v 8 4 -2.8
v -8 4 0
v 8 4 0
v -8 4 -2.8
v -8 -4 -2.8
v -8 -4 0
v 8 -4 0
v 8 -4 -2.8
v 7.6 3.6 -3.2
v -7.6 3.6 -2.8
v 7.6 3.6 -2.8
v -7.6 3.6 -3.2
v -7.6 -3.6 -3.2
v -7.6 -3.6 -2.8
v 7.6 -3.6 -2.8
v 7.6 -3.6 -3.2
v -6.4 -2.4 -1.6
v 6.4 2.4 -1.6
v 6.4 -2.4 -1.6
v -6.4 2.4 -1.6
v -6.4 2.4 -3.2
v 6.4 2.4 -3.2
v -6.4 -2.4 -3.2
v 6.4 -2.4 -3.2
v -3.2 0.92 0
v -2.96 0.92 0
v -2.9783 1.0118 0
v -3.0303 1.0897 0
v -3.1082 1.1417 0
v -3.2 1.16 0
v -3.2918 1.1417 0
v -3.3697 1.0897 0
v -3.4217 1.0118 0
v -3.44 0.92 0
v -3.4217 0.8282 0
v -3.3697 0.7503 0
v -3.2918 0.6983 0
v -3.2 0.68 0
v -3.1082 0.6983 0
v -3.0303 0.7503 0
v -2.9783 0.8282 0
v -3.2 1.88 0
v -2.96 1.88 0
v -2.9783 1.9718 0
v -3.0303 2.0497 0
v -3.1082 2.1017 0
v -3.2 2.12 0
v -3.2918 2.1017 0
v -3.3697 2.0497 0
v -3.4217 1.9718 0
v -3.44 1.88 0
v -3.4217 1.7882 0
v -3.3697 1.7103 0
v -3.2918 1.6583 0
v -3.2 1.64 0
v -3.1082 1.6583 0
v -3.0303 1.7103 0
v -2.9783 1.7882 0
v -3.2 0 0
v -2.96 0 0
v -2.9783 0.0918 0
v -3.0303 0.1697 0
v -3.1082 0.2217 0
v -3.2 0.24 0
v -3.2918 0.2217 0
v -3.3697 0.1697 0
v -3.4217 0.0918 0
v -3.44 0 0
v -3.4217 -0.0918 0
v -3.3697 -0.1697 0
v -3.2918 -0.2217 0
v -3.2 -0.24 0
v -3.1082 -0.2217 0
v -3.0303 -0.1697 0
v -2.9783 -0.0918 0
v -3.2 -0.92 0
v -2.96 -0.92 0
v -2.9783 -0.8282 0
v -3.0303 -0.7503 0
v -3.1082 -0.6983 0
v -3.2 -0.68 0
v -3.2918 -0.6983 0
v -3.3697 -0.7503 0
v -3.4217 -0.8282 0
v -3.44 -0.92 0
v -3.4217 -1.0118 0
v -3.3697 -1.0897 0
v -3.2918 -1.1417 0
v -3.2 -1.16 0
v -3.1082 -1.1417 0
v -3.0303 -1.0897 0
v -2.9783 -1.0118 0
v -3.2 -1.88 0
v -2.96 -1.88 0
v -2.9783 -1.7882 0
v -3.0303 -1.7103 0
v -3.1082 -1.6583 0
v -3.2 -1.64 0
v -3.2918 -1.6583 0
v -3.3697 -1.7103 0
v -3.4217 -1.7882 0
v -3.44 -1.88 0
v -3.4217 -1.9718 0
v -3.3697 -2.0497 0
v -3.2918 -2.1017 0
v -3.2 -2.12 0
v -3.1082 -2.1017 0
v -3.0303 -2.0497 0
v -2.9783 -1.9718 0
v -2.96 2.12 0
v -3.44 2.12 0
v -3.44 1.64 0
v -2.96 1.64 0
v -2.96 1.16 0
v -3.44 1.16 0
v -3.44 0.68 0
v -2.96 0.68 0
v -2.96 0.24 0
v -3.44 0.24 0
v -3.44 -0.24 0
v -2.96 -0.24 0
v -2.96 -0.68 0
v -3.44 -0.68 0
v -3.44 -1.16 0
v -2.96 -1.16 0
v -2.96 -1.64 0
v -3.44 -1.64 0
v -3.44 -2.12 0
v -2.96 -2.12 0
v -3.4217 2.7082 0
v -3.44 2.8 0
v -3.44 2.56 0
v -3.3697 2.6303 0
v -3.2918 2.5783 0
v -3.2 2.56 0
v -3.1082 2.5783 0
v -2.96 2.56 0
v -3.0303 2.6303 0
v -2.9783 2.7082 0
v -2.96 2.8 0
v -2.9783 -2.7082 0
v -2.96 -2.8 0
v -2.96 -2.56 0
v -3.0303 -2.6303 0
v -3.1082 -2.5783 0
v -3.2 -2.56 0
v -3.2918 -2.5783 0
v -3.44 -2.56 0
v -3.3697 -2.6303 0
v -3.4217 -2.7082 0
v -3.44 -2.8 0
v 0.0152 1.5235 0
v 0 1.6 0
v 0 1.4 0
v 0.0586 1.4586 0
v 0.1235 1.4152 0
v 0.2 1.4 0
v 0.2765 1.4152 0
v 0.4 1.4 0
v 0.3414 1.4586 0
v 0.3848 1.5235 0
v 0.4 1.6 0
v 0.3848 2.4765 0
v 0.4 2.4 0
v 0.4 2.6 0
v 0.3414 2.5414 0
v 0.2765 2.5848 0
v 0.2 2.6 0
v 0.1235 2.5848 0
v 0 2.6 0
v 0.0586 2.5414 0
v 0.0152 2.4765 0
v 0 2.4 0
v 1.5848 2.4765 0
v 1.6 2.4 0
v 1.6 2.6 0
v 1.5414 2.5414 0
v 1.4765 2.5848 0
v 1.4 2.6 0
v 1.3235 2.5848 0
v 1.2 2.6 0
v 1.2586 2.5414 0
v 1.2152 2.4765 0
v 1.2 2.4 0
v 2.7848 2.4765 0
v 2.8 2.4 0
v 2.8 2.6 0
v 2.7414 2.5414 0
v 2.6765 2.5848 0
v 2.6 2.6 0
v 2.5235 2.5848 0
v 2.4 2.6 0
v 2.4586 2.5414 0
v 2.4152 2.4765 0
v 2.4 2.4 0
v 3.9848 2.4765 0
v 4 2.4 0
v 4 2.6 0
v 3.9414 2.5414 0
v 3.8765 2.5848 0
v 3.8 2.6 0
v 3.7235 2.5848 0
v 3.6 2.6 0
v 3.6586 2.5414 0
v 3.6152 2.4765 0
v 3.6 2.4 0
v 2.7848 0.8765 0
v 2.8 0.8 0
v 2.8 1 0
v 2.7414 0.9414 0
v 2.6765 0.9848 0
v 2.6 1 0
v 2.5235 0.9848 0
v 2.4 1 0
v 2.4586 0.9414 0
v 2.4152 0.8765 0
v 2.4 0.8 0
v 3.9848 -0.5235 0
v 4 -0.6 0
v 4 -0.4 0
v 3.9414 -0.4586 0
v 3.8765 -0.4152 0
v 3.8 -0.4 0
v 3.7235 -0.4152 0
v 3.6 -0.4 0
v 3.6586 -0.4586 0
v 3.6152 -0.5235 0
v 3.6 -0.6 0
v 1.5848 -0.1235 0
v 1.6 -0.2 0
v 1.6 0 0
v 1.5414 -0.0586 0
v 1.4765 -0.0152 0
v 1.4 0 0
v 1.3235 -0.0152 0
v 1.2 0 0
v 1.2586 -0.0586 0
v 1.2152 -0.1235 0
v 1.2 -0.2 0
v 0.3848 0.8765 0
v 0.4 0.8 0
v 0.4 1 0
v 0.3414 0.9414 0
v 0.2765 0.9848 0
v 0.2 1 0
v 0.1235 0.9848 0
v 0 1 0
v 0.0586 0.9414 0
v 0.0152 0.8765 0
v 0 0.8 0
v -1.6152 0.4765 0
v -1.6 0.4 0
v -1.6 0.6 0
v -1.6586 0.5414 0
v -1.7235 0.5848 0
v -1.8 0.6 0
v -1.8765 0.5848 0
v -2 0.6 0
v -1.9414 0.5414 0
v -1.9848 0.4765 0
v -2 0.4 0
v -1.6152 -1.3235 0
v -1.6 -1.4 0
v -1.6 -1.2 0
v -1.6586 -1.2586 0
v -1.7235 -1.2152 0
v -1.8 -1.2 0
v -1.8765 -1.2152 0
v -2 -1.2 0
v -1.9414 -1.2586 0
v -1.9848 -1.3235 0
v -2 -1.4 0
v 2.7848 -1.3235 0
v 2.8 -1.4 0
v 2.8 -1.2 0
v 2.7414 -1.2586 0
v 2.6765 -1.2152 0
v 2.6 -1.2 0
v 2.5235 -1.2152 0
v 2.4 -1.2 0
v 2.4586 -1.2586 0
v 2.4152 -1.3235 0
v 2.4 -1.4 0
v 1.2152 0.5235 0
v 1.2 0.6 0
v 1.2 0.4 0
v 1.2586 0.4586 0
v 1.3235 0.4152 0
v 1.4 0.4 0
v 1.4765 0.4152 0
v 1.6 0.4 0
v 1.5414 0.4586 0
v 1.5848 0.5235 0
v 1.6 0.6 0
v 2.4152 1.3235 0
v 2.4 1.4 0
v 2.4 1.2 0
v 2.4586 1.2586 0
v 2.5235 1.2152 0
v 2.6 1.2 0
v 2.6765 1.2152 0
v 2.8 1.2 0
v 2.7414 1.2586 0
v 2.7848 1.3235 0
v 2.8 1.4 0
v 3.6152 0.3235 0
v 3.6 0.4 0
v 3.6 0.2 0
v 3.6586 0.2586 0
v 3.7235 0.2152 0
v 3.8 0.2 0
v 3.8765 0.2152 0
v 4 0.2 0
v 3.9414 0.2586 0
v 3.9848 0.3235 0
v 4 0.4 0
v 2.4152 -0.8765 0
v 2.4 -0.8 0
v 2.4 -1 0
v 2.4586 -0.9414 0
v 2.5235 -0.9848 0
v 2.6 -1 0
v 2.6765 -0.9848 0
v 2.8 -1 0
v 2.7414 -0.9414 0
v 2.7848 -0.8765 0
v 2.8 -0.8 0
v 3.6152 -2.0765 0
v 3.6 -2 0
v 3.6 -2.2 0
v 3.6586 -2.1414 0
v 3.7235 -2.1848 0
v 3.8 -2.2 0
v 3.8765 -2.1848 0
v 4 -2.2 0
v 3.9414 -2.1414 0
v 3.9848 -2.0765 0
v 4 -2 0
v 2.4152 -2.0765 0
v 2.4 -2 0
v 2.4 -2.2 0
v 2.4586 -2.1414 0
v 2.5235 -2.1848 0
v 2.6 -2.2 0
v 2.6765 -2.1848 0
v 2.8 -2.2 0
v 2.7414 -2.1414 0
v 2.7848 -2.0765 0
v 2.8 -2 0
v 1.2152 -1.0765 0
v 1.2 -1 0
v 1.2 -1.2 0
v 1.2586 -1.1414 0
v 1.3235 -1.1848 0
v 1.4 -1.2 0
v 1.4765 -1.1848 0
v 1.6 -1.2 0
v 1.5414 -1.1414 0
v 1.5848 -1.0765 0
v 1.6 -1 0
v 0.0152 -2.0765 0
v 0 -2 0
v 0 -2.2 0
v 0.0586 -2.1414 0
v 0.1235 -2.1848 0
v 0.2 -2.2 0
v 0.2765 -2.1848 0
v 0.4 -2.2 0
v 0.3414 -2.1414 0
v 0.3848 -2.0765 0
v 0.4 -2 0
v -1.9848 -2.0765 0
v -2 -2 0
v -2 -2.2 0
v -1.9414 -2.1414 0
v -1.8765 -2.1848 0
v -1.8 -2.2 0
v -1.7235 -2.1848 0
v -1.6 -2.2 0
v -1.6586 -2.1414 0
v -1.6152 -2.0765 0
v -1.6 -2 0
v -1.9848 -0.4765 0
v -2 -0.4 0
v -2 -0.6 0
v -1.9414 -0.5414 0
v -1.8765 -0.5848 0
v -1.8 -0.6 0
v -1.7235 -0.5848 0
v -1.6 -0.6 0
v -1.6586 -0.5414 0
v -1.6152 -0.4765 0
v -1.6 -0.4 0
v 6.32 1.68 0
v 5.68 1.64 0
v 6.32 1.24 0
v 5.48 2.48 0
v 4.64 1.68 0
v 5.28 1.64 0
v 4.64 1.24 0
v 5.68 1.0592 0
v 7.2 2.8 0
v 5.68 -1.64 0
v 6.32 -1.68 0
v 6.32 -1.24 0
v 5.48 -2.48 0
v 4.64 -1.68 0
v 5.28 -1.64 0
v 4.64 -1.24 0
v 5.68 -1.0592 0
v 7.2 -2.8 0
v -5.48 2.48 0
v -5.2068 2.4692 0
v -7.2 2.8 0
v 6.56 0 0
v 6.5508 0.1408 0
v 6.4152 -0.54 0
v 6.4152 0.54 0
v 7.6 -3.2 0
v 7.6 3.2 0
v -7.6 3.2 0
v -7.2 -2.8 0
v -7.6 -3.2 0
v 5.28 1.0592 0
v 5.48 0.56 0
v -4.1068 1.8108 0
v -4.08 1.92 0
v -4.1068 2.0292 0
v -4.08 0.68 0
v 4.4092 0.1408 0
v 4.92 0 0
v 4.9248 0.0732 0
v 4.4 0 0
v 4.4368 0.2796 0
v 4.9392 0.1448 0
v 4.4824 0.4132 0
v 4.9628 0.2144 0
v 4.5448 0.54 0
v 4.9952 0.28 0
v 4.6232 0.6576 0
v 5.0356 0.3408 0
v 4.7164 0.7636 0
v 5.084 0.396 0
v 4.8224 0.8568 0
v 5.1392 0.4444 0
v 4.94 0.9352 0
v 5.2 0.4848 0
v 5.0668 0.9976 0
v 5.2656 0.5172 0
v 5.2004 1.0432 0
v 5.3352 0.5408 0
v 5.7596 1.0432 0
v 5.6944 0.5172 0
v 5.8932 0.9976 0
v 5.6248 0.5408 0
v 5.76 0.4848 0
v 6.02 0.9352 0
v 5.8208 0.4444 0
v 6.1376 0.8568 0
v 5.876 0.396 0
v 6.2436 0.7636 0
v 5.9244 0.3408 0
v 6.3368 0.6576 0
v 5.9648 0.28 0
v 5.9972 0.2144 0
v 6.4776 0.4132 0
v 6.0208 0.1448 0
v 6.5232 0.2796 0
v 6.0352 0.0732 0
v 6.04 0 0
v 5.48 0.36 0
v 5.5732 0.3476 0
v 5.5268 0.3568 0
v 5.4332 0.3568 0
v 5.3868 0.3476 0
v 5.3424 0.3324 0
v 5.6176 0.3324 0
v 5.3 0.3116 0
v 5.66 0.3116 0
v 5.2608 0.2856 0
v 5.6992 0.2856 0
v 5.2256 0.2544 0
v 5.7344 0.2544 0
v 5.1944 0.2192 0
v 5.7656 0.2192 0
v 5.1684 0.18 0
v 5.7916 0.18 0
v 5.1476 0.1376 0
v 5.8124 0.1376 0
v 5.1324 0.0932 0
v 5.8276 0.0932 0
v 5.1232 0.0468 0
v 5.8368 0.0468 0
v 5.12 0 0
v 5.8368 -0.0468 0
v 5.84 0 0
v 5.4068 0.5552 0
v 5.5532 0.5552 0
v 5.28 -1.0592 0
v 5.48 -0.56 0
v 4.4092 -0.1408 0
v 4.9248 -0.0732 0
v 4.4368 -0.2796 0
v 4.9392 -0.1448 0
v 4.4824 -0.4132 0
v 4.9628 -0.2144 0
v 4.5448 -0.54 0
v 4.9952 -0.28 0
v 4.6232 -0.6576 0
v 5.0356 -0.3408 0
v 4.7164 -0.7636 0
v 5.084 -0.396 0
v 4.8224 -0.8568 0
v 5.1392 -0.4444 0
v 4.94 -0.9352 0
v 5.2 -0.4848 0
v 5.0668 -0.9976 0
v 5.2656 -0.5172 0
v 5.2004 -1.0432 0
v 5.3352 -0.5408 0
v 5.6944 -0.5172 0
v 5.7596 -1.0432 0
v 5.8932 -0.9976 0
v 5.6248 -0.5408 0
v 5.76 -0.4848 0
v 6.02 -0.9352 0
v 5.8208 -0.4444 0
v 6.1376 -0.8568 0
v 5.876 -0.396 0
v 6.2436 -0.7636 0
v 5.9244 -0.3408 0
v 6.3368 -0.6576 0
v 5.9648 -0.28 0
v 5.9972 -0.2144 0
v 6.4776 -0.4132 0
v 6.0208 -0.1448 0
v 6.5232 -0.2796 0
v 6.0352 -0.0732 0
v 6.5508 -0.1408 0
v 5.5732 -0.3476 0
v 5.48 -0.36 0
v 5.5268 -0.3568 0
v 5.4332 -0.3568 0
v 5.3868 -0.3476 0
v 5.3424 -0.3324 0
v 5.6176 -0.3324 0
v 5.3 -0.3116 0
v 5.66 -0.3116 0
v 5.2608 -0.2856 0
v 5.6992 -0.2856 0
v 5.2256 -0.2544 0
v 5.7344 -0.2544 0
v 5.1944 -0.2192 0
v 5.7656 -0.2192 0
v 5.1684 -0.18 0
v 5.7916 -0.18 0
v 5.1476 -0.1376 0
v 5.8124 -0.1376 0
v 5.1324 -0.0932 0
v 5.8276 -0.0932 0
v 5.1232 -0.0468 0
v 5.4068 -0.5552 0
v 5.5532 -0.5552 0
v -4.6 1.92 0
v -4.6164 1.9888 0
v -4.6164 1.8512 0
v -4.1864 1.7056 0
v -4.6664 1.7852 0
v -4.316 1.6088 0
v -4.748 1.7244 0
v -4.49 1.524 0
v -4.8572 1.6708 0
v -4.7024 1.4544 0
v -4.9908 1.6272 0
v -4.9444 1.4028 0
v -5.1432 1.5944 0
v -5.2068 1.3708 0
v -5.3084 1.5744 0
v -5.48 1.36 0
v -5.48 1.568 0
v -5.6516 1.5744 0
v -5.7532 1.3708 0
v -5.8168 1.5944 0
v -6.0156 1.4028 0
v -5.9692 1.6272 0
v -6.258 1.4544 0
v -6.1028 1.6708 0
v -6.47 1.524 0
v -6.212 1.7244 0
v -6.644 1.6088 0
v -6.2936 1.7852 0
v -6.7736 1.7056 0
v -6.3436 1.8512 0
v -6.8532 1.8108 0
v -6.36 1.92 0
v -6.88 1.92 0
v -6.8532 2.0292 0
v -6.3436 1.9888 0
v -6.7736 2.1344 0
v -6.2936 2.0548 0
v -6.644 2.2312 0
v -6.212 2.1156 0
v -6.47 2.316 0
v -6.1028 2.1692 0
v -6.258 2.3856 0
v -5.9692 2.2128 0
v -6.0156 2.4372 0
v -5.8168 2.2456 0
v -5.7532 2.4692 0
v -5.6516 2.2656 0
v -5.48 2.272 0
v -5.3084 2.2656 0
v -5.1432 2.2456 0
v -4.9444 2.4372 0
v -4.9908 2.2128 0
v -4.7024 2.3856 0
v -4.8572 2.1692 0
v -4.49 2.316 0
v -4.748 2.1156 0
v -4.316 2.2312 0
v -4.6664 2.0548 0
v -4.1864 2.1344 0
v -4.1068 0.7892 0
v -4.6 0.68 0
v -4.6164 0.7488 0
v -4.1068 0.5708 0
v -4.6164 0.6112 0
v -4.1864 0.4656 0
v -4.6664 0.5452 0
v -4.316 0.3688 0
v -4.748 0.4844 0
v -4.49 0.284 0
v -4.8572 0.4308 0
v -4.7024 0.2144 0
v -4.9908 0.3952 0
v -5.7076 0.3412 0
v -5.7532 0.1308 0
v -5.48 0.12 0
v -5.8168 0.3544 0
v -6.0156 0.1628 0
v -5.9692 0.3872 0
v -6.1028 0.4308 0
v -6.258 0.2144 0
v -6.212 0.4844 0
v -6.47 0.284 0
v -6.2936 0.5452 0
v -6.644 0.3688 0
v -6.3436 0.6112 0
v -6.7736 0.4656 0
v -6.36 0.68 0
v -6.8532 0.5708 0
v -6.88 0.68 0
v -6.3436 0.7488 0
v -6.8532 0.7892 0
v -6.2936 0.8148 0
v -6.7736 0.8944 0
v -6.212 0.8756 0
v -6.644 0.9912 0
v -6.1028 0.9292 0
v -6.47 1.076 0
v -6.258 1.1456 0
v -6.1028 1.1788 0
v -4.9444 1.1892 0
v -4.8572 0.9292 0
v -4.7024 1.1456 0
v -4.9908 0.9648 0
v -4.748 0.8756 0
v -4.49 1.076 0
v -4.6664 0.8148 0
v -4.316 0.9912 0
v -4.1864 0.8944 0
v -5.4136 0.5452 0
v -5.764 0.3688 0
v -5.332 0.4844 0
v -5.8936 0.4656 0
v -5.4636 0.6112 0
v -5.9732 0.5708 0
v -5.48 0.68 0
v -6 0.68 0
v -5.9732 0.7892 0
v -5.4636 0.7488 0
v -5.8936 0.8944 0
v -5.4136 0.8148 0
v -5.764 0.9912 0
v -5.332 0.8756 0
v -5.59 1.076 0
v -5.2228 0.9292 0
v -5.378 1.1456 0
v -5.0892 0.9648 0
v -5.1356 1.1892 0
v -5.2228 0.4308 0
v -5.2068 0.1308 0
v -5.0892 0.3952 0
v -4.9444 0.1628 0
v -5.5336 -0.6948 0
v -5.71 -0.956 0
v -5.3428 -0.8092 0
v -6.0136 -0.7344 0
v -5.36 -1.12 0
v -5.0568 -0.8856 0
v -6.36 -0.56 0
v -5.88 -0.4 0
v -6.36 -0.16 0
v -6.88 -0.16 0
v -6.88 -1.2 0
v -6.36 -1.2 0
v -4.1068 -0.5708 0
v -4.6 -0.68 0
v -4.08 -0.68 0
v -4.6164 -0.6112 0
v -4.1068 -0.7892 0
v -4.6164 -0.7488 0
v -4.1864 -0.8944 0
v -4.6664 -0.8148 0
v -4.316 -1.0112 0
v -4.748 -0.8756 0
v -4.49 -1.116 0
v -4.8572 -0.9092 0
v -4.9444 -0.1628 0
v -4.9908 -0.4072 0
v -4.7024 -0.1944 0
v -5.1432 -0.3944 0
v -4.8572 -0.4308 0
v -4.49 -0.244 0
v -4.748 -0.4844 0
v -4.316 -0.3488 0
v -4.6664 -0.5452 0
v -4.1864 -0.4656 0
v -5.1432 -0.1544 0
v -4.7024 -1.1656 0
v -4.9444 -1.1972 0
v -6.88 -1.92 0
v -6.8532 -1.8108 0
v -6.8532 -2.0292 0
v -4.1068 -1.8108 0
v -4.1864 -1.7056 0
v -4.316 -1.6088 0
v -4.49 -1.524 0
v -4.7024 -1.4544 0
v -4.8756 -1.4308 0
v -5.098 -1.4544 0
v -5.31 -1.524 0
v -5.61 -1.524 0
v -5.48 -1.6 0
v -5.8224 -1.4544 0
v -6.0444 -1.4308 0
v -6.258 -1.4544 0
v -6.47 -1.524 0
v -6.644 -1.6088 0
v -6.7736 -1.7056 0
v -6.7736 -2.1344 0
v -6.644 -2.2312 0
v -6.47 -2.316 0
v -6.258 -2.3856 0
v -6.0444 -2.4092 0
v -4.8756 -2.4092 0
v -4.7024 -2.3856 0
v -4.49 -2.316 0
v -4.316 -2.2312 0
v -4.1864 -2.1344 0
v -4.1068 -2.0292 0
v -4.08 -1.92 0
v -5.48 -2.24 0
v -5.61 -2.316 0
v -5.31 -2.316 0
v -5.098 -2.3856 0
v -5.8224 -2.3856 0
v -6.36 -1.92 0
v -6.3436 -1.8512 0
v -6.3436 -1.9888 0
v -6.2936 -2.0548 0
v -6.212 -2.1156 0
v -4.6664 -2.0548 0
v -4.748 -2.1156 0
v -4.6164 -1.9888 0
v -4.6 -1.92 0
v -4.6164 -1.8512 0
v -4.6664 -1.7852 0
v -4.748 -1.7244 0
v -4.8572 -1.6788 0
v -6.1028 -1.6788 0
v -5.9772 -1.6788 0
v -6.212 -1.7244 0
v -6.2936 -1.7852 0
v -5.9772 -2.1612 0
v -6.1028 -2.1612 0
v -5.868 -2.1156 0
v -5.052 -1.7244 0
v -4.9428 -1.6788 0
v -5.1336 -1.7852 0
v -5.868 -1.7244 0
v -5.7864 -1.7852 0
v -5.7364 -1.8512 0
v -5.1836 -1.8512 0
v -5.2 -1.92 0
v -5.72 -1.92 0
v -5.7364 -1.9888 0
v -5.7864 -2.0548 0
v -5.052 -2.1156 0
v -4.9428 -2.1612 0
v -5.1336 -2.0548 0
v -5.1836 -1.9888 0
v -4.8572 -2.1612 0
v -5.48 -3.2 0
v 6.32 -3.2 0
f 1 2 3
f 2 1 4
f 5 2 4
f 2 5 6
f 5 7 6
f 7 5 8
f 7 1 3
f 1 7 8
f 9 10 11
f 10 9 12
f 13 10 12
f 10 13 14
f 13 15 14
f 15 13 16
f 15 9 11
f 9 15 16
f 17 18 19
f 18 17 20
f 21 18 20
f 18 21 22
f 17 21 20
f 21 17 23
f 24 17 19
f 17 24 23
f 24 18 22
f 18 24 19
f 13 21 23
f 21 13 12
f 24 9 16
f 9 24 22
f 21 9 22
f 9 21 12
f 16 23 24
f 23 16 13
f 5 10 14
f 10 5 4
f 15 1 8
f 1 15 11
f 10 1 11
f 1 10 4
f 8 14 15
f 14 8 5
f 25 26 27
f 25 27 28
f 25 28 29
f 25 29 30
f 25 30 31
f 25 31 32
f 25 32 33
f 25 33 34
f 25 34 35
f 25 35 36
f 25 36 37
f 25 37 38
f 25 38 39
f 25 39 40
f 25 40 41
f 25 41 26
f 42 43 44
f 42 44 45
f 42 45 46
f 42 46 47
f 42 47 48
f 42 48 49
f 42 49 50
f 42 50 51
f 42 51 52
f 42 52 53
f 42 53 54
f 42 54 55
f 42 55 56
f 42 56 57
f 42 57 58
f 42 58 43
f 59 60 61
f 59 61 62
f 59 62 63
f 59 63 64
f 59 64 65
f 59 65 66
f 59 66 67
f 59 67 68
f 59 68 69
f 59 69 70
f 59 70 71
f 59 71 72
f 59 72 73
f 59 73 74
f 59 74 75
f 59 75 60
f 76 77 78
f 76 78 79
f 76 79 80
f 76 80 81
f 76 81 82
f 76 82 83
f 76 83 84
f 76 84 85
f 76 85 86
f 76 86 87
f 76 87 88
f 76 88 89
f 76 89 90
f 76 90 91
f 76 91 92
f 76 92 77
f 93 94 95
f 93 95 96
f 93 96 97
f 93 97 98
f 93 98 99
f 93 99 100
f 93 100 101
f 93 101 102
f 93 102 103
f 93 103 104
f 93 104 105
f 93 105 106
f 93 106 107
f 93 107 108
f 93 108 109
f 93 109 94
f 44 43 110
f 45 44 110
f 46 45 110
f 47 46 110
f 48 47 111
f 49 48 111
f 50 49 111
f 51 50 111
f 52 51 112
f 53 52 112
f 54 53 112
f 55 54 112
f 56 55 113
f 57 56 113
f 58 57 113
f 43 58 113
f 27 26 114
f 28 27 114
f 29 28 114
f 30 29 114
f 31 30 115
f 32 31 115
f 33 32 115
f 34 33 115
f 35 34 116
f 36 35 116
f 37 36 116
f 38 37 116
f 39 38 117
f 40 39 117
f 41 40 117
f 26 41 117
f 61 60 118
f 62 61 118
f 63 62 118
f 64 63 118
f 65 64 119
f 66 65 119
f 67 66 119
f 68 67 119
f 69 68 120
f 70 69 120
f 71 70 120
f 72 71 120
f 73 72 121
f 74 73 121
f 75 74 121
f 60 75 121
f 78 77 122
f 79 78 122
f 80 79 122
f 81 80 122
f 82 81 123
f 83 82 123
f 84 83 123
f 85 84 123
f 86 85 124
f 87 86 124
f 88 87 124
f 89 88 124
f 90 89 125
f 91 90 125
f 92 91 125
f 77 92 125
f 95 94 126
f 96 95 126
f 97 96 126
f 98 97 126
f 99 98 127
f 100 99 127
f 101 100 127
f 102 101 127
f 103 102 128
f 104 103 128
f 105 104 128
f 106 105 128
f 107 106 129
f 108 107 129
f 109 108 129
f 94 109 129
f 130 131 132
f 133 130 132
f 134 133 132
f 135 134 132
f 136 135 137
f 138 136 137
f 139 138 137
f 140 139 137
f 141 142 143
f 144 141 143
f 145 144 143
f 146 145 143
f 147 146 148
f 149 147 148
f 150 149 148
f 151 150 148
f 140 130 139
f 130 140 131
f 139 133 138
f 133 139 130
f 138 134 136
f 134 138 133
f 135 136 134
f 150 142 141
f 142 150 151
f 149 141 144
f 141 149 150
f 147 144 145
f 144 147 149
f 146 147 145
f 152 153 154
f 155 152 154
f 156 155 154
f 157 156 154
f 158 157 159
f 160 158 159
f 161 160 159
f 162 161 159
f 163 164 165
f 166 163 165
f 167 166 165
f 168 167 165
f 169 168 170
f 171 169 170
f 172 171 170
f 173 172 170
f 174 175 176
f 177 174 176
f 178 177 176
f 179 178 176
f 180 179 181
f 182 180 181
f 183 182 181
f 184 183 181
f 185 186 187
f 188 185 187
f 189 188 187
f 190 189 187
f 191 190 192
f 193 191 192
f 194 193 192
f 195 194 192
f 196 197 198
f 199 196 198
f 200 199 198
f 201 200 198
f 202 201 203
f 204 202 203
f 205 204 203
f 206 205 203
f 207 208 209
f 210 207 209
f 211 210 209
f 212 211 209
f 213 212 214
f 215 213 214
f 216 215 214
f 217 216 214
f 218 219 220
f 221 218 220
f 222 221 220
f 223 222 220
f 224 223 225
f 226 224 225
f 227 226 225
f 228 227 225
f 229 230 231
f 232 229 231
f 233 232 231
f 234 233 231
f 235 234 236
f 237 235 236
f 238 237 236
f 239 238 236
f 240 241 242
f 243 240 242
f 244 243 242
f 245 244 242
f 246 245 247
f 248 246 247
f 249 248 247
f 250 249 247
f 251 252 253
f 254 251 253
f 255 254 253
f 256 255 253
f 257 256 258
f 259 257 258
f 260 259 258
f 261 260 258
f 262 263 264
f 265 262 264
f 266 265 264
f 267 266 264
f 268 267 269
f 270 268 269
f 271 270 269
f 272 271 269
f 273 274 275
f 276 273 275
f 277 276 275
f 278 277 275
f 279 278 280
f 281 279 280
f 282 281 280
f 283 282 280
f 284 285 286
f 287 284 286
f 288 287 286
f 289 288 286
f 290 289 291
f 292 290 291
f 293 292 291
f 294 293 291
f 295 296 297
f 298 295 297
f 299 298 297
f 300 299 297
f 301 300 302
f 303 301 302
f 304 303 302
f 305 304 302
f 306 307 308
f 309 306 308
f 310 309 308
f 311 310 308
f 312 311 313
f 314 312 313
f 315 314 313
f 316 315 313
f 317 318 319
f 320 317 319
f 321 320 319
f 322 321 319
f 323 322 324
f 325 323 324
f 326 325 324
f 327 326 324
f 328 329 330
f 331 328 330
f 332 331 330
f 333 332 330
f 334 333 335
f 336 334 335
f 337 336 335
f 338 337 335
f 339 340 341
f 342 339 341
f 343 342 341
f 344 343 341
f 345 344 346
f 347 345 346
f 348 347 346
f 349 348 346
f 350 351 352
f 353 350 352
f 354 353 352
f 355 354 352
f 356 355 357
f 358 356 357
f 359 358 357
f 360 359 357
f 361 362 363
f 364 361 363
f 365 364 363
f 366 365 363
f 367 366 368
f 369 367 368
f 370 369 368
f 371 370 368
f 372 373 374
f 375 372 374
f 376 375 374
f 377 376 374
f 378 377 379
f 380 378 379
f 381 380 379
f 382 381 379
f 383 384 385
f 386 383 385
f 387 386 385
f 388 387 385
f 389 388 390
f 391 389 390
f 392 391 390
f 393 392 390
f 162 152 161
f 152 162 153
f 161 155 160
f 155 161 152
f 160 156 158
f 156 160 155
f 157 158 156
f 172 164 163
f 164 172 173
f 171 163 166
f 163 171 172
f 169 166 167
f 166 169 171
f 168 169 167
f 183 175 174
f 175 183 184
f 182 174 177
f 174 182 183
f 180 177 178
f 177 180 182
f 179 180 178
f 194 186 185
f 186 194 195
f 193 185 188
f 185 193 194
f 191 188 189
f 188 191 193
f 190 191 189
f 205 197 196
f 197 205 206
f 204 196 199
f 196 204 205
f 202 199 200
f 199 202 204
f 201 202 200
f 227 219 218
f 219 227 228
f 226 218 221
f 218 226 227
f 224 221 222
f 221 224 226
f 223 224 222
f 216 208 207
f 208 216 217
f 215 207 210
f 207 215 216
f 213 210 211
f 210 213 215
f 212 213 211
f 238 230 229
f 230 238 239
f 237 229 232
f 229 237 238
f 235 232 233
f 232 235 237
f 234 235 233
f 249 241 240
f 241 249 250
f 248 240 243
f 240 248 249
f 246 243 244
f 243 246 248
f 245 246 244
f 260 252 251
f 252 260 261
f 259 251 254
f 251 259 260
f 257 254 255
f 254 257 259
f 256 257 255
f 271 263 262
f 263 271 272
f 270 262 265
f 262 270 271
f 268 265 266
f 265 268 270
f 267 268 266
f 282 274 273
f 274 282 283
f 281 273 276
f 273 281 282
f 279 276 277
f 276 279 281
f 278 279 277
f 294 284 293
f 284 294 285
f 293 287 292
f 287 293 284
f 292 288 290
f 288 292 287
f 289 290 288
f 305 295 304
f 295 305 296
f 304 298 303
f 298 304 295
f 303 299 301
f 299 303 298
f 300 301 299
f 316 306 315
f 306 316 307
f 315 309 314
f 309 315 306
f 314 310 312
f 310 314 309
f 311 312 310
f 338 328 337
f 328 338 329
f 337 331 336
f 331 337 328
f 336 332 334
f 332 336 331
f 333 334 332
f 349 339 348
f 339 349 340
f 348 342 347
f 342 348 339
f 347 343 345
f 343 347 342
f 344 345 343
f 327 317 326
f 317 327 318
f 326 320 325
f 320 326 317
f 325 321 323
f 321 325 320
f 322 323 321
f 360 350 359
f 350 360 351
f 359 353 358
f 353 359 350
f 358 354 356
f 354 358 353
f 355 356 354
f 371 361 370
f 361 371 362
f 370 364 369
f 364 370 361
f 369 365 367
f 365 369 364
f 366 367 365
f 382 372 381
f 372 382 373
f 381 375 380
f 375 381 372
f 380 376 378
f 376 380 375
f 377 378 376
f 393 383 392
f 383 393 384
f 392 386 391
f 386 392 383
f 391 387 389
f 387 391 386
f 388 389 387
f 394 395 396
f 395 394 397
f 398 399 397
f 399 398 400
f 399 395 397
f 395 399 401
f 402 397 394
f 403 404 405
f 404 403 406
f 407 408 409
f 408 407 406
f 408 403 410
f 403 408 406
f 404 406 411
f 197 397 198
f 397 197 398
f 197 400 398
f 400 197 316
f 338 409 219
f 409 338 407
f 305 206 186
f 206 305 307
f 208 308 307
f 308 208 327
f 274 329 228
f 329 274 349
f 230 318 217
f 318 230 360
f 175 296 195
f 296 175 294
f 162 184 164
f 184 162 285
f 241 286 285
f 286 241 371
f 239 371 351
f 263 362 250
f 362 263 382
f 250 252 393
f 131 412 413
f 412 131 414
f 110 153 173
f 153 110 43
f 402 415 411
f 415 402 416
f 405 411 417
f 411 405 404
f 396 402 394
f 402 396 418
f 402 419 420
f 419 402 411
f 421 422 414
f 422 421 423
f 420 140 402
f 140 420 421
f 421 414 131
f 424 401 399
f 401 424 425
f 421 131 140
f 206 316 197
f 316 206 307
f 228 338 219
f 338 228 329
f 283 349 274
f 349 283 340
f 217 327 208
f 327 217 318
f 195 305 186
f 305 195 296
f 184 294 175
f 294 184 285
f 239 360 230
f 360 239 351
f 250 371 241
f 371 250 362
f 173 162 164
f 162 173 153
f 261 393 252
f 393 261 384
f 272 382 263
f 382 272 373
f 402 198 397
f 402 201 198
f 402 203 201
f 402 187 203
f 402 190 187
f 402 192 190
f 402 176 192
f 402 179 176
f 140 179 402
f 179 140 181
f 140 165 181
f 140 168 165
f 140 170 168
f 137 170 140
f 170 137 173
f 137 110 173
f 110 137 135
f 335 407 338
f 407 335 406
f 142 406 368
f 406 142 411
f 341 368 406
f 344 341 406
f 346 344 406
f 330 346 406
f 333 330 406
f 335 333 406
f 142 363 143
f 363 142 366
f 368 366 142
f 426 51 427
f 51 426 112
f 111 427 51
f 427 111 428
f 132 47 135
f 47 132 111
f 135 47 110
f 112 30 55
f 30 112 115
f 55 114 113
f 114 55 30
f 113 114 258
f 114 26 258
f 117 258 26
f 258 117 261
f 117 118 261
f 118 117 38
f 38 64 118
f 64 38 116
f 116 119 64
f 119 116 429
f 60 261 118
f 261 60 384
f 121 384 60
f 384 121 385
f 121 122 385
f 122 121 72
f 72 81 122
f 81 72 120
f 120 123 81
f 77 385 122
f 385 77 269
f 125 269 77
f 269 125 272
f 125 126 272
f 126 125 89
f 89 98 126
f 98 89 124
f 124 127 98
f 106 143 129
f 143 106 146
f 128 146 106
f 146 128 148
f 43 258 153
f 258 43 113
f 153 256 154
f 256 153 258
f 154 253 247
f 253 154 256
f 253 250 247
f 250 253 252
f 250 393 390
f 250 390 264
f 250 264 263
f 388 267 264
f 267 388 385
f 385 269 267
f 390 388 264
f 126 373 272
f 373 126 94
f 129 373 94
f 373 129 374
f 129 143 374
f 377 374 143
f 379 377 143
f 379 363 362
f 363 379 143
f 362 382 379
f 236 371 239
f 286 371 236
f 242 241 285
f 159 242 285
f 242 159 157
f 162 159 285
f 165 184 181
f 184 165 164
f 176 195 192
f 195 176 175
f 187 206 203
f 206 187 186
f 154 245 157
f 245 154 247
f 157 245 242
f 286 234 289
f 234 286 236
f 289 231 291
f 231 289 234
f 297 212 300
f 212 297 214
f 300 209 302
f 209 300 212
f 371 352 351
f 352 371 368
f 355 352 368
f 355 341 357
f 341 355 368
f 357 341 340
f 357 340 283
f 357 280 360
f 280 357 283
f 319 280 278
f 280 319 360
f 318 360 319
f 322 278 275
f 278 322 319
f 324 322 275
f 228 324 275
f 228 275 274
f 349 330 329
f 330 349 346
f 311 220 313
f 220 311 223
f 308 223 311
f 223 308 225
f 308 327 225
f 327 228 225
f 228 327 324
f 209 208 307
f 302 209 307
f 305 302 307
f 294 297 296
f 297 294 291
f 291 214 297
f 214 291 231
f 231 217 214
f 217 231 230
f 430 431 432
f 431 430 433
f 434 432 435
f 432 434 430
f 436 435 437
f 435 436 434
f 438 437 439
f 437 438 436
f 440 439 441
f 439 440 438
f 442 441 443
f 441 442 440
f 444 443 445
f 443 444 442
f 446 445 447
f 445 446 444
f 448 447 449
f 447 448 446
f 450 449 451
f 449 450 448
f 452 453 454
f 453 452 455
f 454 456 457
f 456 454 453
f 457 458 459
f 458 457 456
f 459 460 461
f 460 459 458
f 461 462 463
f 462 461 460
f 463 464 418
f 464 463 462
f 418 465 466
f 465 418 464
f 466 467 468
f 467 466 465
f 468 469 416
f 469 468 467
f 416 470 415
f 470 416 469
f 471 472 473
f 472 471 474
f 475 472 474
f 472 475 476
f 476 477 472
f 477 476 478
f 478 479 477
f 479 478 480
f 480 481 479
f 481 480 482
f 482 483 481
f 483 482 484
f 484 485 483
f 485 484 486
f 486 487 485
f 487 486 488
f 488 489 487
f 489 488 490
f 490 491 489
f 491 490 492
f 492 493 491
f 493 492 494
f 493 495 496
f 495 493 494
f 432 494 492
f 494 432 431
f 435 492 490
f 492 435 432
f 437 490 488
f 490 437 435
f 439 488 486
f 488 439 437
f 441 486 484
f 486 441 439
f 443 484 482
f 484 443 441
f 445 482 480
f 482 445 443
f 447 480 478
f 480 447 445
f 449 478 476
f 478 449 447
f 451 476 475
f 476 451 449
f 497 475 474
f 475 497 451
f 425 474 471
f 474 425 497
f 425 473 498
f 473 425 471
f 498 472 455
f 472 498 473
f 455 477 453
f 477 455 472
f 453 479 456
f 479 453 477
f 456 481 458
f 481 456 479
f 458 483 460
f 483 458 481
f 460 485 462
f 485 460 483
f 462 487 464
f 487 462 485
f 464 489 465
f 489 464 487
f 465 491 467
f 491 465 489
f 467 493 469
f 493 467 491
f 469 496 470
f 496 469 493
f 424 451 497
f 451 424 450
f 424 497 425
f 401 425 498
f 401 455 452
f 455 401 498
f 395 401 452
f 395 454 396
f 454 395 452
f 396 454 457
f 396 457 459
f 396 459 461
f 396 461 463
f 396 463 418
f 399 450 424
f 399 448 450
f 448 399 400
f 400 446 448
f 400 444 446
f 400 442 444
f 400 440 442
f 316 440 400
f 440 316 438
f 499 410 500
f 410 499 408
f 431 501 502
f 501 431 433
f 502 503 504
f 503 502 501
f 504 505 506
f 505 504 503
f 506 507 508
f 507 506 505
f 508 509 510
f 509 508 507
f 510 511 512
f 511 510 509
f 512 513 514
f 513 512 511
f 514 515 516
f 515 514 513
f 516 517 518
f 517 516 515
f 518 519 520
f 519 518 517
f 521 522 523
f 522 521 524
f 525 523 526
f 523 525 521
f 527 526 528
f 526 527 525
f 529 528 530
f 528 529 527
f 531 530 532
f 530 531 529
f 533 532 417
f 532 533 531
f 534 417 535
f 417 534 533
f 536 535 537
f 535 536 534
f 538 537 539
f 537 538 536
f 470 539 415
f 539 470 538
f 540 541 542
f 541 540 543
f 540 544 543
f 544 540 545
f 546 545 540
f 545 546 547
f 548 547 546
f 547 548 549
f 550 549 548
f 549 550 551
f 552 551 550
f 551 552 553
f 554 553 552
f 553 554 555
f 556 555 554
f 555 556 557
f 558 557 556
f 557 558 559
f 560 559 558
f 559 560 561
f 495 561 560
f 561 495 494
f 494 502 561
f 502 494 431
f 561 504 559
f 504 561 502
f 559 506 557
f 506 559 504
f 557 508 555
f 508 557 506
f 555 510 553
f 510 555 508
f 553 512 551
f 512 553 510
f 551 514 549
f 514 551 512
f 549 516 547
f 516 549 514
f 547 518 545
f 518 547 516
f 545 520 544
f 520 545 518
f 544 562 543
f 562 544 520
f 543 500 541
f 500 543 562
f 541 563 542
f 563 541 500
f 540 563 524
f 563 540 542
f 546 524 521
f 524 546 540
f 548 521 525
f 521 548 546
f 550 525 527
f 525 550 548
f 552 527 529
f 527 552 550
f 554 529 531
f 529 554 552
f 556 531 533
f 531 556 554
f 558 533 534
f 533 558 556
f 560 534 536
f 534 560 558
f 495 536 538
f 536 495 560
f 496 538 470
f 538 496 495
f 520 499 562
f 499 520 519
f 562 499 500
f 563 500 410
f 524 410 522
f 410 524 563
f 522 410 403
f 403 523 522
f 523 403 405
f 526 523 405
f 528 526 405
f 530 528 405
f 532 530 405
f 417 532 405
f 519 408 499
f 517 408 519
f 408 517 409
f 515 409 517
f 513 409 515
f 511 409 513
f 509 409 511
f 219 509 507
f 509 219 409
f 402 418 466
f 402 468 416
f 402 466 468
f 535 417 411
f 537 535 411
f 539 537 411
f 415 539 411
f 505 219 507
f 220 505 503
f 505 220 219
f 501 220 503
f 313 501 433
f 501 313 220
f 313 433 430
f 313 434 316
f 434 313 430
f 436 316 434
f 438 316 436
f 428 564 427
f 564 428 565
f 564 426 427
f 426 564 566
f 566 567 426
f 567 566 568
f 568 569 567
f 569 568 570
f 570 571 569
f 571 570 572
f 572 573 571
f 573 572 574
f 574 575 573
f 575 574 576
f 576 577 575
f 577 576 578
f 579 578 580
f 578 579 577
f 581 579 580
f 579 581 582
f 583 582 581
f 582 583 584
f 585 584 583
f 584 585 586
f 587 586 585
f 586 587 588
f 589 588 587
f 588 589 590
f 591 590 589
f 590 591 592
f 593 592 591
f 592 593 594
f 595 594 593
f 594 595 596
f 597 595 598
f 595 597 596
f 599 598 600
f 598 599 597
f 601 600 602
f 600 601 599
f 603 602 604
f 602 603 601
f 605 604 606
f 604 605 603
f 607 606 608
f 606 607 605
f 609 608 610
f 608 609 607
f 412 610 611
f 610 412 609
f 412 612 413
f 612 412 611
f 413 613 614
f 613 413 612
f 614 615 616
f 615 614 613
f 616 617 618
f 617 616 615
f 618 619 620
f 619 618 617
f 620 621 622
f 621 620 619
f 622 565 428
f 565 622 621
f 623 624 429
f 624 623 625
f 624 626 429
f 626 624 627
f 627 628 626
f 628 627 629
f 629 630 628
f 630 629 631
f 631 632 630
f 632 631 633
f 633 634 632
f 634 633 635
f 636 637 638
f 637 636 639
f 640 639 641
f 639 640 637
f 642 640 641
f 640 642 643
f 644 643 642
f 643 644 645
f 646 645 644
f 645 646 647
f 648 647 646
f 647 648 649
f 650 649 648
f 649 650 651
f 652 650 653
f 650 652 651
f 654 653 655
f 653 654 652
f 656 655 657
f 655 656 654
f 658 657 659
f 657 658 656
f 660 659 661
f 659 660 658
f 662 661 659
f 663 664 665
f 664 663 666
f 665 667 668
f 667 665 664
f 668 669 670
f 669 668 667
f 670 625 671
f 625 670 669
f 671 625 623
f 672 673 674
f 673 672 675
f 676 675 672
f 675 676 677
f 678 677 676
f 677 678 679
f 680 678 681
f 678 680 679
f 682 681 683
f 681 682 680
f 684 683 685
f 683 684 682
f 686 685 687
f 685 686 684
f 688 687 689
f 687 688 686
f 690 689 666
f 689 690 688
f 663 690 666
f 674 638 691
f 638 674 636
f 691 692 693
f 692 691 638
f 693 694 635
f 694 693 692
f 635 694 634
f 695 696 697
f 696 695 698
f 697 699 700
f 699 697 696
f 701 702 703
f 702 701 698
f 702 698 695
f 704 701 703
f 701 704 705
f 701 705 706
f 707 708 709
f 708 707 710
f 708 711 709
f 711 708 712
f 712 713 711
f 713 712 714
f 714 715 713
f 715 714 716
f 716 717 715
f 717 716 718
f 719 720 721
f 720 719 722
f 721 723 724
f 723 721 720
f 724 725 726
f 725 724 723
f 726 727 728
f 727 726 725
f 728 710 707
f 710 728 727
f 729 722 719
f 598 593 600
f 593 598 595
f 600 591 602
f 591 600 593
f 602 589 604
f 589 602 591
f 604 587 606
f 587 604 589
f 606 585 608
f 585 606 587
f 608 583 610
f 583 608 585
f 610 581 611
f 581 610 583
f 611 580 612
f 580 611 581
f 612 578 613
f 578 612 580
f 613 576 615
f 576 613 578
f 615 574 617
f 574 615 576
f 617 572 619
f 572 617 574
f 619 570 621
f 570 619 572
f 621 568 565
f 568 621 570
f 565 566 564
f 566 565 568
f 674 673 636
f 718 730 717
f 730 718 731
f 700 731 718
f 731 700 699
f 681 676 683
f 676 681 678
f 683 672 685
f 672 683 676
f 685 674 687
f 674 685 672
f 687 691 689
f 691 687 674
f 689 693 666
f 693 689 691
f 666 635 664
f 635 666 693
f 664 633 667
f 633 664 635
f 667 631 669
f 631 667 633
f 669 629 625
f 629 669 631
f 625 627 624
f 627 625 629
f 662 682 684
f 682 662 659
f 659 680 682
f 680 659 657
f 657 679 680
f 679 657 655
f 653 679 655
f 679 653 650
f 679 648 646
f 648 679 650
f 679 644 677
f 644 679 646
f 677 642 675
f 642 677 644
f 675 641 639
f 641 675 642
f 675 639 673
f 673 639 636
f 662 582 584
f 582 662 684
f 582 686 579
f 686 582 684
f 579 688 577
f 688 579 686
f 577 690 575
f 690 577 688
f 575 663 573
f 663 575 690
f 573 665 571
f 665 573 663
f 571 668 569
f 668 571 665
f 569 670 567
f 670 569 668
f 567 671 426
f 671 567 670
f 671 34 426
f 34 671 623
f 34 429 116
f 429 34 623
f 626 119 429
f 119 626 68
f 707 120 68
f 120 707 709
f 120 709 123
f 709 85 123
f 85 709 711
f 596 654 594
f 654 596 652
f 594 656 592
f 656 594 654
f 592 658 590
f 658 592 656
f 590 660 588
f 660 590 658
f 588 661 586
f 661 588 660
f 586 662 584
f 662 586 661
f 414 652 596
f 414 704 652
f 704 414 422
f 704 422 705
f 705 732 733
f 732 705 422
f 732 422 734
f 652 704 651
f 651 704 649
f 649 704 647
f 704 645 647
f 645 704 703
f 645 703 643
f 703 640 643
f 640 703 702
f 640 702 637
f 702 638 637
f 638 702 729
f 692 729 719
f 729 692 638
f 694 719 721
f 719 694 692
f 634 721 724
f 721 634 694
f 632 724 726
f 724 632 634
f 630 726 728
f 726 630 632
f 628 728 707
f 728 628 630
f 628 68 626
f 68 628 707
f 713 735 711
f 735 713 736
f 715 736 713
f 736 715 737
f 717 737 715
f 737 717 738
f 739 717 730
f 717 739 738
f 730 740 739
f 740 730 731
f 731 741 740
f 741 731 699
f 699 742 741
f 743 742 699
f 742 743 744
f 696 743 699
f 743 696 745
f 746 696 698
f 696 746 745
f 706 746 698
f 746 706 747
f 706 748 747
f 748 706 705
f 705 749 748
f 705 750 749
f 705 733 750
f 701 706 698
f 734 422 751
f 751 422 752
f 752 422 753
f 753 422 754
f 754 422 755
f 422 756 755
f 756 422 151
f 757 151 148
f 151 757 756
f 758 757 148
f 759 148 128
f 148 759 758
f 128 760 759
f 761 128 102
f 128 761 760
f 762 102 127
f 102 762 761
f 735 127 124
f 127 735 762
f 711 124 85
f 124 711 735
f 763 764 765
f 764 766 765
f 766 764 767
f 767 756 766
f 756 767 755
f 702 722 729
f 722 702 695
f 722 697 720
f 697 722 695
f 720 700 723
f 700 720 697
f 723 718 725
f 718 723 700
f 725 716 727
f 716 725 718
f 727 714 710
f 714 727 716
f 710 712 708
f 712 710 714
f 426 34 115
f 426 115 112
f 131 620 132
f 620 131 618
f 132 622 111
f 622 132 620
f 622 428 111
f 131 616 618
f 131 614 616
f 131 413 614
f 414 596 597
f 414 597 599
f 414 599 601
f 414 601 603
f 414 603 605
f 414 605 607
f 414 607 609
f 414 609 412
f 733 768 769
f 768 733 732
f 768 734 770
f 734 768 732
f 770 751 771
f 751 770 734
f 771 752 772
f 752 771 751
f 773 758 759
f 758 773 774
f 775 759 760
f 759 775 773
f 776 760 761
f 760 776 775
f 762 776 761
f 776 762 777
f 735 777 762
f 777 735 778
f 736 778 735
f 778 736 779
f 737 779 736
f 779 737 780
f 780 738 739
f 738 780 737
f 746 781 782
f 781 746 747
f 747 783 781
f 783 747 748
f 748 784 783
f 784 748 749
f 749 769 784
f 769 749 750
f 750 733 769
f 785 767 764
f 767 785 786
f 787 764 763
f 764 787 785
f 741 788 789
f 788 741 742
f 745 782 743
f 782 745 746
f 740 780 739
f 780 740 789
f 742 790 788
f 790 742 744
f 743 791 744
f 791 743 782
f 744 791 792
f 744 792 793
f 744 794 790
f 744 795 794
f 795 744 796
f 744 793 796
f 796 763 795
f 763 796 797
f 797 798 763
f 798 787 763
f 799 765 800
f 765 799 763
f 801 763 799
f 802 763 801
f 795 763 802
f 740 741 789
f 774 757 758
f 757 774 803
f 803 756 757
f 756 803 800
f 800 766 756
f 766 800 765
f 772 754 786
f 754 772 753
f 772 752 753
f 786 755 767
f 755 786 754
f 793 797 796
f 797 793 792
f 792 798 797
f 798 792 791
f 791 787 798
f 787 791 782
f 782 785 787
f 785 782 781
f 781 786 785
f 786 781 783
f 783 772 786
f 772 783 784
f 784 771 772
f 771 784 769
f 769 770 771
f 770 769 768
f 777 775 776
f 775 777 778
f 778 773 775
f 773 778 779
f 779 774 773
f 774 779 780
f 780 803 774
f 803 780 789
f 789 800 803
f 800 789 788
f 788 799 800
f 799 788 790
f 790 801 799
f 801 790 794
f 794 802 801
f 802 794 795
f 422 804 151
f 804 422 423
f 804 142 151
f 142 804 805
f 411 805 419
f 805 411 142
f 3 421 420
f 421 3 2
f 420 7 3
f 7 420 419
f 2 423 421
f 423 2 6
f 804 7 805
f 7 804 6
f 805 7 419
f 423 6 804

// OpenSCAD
use <../lib.scad>
use <s/3069bp1as01.scad>
use <s/3069bs01.scad>
function ldraw_lib__3069bp1a() = [
// 0 Tile  1 x  2 with Train Logo and "0928" Ticket Pattern
// 0 Name: 3069bp1a.dat
// 0 Author: Tim Lampmann [L4mpi]
// 0 !LDRAW_ORG Part UPDATE 2022-04
// 0 !LICENSE Licensed under CC BY 4.0 : see CAreadme.txt
// 
// 0 BFC CERTIFY CCW
  [0,"BFC","CERTIFY"],
  [0,"BFC","CCW"],
// 
// 0 !KEYWORDS BrickLink 3069pb0029, Central, Grand, High, locomotive
// 0 !KEYWORDS Rebrickable 3069bpr0065, Set 10157, Speed, Station
// 
// 0 !HISTORY 2022-07-18 [PTadmin] Official Update 2022-04
// 
// 
// 1 16 0 0 0 1 0 0 0 1 0 0 0 1 s\3069bs01.dat
  [1,16,0,0,0,1,0,0,0,1,0,0,0,1, ldraw_lib__s__3069bs01()],
// 1 16 0 0 0 1 0 0 0 1 0 0 0 1 s\3069bp1as01.dat
  [1,16,0,0,0,1,0,0,0,1,0,0,0,1, ldraw_lib__s__3069bp1as01()],
// 
// 4 16 -20 0 10 -19 0 8 19 0 8 20 0 10
  [4,16,-20,0,10,-19,0,8,19,0,8,20,0,10],
// 4 16 20 0 10 19 0 8 19 0 -8 20 0 -10
  [4,16,20,0,10,19,0,8,19,0,-8,20,0,-10],
// 4 16 -19 0 8 -20 0 10 -20 0 -10 -19 0 -8
  [4,16,-19,0,8,-20,0,10,-20,0,-10,-19,0,-8],
// 4 16 15.8 0 -8 -13.7 0 -8 -20 0 -10 20 0 -10
  [4,16,15.8,0,-8,-13.7,0,-8,-20,0,-10,20,0,-10],
// 3 16 15.8 0 -8 20 0 -10 19 0 -8
  [3,16,15.8,0,-8,20,0,-10,19,0,-8],
// 3 16 -19 0 -8 -20 0 -10 -13.7 0 -8
  [3,16,-19,0,-8,-20,0,-10,-13.7,0,-8],
];
module ldraw_lib__3069bp1a(step=0, col=false, unit=2/5, alt=false, line=0.2, solid=!$preview)
    makepoly(ldraw_lib__3069bp1a(), step=step, col=col, unit=unit, alt=alt, line=line, solid=solid);
ldraw_lib__3069bp1a(line=0.2);
